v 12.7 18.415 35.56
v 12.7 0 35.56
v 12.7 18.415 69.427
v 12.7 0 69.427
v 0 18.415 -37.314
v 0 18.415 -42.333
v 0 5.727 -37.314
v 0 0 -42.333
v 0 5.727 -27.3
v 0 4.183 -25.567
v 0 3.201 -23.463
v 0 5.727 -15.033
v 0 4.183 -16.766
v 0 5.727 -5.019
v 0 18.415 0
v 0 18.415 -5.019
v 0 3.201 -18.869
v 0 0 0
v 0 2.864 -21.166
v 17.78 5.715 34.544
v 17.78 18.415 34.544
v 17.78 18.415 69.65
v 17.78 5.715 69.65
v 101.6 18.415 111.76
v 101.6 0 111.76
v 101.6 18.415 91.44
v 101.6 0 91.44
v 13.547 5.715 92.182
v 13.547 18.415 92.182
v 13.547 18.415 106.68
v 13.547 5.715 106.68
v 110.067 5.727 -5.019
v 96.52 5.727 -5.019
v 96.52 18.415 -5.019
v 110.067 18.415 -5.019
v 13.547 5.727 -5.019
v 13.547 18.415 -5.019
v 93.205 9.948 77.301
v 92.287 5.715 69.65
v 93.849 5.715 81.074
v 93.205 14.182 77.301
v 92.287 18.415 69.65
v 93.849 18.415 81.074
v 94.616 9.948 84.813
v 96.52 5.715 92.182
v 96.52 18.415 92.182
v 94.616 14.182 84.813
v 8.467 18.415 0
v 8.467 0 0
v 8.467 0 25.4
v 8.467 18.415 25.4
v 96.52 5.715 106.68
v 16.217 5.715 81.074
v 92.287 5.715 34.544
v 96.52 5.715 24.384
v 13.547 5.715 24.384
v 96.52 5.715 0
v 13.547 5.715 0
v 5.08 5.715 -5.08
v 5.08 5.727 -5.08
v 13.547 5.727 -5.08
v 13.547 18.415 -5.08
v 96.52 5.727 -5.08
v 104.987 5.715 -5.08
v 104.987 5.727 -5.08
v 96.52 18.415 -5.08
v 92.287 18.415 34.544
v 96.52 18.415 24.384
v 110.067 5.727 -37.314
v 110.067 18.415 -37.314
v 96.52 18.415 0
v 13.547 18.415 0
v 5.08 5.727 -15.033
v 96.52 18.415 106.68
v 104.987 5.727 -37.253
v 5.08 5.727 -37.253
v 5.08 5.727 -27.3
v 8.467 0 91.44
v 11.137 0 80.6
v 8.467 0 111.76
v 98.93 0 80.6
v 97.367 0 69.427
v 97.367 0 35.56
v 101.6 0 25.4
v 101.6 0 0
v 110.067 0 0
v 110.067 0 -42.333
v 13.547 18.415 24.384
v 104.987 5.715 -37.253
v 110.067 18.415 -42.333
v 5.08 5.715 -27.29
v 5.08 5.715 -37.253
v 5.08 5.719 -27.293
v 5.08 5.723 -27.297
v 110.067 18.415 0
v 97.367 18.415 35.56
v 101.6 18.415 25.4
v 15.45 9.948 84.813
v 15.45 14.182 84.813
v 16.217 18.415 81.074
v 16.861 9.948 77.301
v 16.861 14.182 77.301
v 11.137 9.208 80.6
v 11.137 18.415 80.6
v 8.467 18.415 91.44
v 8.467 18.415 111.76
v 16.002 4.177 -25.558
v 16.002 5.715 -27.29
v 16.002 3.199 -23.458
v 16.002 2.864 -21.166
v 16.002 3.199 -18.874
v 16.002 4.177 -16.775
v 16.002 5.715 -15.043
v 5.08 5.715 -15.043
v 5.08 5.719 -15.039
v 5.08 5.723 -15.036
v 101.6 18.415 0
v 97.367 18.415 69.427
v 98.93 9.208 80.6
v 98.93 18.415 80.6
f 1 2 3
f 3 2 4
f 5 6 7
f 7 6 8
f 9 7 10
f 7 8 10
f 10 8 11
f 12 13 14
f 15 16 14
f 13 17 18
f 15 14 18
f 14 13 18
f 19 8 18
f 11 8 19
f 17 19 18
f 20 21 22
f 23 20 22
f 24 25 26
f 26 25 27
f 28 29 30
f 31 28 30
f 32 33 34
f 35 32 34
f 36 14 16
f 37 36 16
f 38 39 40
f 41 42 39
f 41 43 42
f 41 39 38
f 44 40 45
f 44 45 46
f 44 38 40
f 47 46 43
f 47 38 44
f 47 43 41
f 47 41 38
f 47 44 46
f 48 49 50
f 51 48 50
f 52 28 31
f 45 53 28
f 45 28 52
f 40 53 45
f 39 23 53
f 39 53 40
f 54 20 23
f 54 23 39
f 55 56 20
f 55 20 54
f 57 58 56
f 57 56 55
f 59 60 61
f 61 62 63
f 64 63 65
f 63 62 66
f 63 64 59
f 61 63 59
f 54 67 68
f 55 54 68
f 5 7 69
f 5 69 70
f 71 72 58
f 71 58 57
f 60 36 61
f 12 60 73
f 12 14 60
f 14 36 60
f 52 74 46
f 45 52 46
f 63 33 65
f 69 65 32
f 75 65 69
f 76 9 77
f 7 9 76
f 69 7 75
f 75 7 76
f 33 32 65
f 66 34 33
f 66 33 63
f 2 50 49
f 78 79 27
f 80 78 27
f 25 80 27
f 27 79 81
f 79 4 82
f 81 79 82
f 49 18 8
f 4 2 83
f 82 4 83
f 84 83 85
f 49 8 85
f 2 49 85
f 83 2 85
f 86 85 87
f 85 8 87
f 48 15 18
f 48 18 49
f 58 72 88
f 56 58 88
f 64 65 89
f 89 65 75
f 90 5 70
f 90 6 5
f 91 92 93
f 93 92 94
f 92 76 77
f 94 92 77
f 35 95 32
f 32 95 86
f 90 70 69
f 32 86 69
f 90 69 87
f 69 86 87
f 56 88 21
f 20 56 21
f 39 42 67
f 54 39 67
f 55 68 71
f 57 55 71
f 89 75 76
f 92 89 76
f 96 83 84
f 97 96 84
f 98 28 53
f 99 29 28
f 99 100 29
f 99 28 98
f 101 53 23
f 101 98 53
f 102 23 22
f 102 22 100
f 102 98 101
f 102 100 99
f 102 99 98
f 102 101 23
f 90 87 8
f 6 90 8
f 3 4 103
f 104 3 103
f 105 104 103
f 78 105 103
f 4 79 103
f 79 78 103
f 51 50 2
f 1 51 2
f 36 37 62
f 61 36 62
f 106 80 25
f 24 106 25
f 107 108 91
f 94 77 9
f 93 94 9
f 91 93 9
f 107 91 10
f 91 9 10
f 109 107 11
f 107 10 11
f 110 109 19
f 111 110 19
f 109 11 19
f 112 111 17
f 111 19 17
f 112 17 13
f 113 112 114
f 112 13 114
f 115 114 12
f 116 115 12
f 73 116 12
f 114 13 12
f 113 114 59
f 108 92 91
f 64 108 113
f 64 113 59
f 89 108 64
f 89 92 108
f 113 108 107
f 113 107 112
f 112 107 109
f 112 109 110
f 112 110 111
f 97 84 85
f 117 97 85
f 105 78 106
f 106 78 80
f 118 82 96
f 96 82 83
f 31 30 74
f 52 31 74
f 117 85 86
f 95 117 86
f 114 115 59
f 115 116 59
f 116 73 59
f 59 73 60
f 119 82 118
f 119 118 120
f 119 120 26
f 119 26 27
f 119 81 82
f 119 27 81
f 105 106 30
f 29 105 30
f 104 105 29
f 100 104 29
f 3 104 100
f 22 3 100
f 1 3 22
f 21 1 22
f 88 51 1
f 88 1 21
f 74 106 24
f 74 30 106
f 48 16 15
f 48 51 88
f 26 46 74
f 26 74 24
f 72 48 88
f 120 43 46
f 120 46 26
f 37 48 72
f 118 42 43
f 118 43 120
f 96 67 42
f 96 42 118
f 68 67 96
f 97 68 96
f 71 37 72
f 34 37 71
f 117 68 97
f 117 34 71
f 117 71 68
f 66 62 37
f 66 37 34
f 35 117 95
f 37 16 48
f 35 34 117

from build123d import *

# Parameters (mm, degrees)
BOSS_EXTRUDE1_DEPTH     = 18.415
CUT_EXTRUDE1_DEPTH      = 12.7
CUT_EXTRUDE2_DEPTH      = 116.078
CUT_EXTRUDE2_DEPTH_BACK = 116.078
SKETCH11_W              = 32.294856704
SKETCH11_H              = 12.721148442
SKETCH12_W              = 82.9732402
SKETCH12_H              = 5.08
BOSS_EXTRUDE3_DEPTH     = 12.7
SKETCH13_R              = 8.001
CUT_EXTRUDE3_DEPTH      = 16.002


with BuildPart() as part:
    # Sketch3 → Boss-Extrude1 (new body)
    with BuildSketch(Plane(origin=(0, 0, 0), x_dir=(1, 0, 0), z_dir=(0, 1, 0))):
        with BuildLine():
            Line((101.599873, 0), (110.066582, 0))
            Line((110.066582, 0), (110.066582, 42.333418))
            Line((110.066582, 42.333418), (55.033291, 42.333418))
            Line((55.033291, 42.333418), (8.4666328, 42.333418))
            Line((8.4666328, 42.333418), (0, 42.333418))
            Line((0, 42.333418), (0, 0))
            Line((0, 0), (8.4666328, 0))
            Line((8.4666328, 0), (8.4666328, -25.4))
            Line((8.4666328, -25.4), (12.6999492, -35.56))
            Line((12.6999492, -35.56), (12.6999492, -69.426582))
            add(Edge.make_bspline(
                [(12.6999492, -69.426582), (11.690404189, -80.766544706), (8.46666328, -91.44)],
                knots=[0, 0, 0, 0.504540069, 0.504540069, 0.504540069], degree=2))
            Line((8.46666328, -91.44), (8.46666328, -111.76))
            Line((8.46666328, -111.76), (101.599995682, -111.76))
            Line((101.599995682, -111.76), (101.599995682, -91.44))
            add(Edge.make_bspline(
                [(97.366709, -69.426582), (98.376270675, -80.766537876), (101.599995682, -91.44)],
                knots=[0, 0, 0, 0.504540407, 0.504540407, 0.504540407], degree=2))
            Line((97.366709, -69.426582), (97.366709, -35.56))
            Line((97.366709, -35.56), (101.599873, -25.4))
            Line((101.599873, -25.4), (101.599873, 0))
        make_face()
    extrude(amount=BOSS_EXTRUDE1_DEPTH)

    # Sketch7 → Cut-Extrude1 (cut)
    with BuildSketch(Plane(origin=(0, 18.415, 0), x_dir=(1, 0, 0), z_dir=(0, 1, 0))):
        with BuildLine():
            Line((104.986582, 5.08), (104.986582, 37.253418))
            Line((104.986582, 37.253418), (5.08, 37.253418))
            Line((5.08, 37.253418), (5.08, 5.08))
            Line((5.08, 5.08), (13.5466328, 5.08))
            Line((13.5466328, 5.08), (13.5466328, -24.384003751))
            Line((13.5466328, -24.384003751), (17.7799492, -34.544003751))
            Line((17.7799492, -34.544003751), (17.7799492, -69.649806794))
            add(Edge.make_bspline(
                [(13.54666328, -92.18157962), (15.696718758, -84.885689198), (17.107633166, -77.368389863), (17.7799492, -69.649806794)],
                knots=[0, 0, 0, 0, 1, 1, 1, 1], degree=3))
            Line((13.54666328, -92.18157962), (13.54666328, -106.68))
            Line((13.54666328, -106.68), (96.519995682, -106.68))
            Line((96.519995682, -106.68), (96.519995682, -92.1815758))
            add(Edge.make_bspline(
                [(92.286709, -69.649810631), (92.959036165, -77.368387225), (94.369950858, -84.885683715), (96.519995682, -92.1815758)],
                knots=[0, 0, 0, 0, 1, 1, 1, 1], degree=3))
            Line((92.286709, -69.649810631), (92.286709, -34.544037514))
            Line((92.286709, -34.544037514), (96.519873, -24.384037514))
            Line((96.519873, -24.384037514), (96.519873, 5.08))
            Line((96.519873, 5.08), (104.986582, 5.08))
        make_face()
    extrude(amount=-CUT_EXTRUDE1_DEPTH, mode=Mode.SUBTRACT)

    # Sketch11 → Cut-Extrude2 (cut, two sides: drawn at the far end of the back side and taken through both)
    with BuildSketch(Plane(origin=(105.08, 0, 0), x_dir=(0, 0, -1), z_dir=(1, 0, 0)).offset(-CUT_EXTRUDE2_DEPTH_BACK)):
        with Locations((21.166087112, 12.087958035)):
            Rectangle(SKETCH11_W, SKETCH11_H)
    extrude(amount=CUT_EXTRUDE2_DEPTH + CUT_EXTRUDE2_DEPTH_BACK, mode=Mode.SUBTRACT)

    # Sketch12 → Boss-Extrude3 (add)
    with BuildSketch(Plane(origin=(0, 18.415, 0), x_dir=(1, 0, 0), z_dir=(0, 1, 0))):
        with Locations((55.0332529, 2.54)):
            Rectangle(SKETCH12_W, SKETCH12_H)
    extrude(amount=-BOSS_EXTRUDE3_DEPTH)

    # Sketch13 → Cut-Extrude3 (cut)
    with BuildSketch(Plane.ZY):
        with Locations((-21.166398056, 10.864691907)):
            Circle(SKETCH13_R)
    extrude(amount=-CUT_EXTRUDE3_DEPTH, mode=Mode.SUBTRACT)


solid = part.part
